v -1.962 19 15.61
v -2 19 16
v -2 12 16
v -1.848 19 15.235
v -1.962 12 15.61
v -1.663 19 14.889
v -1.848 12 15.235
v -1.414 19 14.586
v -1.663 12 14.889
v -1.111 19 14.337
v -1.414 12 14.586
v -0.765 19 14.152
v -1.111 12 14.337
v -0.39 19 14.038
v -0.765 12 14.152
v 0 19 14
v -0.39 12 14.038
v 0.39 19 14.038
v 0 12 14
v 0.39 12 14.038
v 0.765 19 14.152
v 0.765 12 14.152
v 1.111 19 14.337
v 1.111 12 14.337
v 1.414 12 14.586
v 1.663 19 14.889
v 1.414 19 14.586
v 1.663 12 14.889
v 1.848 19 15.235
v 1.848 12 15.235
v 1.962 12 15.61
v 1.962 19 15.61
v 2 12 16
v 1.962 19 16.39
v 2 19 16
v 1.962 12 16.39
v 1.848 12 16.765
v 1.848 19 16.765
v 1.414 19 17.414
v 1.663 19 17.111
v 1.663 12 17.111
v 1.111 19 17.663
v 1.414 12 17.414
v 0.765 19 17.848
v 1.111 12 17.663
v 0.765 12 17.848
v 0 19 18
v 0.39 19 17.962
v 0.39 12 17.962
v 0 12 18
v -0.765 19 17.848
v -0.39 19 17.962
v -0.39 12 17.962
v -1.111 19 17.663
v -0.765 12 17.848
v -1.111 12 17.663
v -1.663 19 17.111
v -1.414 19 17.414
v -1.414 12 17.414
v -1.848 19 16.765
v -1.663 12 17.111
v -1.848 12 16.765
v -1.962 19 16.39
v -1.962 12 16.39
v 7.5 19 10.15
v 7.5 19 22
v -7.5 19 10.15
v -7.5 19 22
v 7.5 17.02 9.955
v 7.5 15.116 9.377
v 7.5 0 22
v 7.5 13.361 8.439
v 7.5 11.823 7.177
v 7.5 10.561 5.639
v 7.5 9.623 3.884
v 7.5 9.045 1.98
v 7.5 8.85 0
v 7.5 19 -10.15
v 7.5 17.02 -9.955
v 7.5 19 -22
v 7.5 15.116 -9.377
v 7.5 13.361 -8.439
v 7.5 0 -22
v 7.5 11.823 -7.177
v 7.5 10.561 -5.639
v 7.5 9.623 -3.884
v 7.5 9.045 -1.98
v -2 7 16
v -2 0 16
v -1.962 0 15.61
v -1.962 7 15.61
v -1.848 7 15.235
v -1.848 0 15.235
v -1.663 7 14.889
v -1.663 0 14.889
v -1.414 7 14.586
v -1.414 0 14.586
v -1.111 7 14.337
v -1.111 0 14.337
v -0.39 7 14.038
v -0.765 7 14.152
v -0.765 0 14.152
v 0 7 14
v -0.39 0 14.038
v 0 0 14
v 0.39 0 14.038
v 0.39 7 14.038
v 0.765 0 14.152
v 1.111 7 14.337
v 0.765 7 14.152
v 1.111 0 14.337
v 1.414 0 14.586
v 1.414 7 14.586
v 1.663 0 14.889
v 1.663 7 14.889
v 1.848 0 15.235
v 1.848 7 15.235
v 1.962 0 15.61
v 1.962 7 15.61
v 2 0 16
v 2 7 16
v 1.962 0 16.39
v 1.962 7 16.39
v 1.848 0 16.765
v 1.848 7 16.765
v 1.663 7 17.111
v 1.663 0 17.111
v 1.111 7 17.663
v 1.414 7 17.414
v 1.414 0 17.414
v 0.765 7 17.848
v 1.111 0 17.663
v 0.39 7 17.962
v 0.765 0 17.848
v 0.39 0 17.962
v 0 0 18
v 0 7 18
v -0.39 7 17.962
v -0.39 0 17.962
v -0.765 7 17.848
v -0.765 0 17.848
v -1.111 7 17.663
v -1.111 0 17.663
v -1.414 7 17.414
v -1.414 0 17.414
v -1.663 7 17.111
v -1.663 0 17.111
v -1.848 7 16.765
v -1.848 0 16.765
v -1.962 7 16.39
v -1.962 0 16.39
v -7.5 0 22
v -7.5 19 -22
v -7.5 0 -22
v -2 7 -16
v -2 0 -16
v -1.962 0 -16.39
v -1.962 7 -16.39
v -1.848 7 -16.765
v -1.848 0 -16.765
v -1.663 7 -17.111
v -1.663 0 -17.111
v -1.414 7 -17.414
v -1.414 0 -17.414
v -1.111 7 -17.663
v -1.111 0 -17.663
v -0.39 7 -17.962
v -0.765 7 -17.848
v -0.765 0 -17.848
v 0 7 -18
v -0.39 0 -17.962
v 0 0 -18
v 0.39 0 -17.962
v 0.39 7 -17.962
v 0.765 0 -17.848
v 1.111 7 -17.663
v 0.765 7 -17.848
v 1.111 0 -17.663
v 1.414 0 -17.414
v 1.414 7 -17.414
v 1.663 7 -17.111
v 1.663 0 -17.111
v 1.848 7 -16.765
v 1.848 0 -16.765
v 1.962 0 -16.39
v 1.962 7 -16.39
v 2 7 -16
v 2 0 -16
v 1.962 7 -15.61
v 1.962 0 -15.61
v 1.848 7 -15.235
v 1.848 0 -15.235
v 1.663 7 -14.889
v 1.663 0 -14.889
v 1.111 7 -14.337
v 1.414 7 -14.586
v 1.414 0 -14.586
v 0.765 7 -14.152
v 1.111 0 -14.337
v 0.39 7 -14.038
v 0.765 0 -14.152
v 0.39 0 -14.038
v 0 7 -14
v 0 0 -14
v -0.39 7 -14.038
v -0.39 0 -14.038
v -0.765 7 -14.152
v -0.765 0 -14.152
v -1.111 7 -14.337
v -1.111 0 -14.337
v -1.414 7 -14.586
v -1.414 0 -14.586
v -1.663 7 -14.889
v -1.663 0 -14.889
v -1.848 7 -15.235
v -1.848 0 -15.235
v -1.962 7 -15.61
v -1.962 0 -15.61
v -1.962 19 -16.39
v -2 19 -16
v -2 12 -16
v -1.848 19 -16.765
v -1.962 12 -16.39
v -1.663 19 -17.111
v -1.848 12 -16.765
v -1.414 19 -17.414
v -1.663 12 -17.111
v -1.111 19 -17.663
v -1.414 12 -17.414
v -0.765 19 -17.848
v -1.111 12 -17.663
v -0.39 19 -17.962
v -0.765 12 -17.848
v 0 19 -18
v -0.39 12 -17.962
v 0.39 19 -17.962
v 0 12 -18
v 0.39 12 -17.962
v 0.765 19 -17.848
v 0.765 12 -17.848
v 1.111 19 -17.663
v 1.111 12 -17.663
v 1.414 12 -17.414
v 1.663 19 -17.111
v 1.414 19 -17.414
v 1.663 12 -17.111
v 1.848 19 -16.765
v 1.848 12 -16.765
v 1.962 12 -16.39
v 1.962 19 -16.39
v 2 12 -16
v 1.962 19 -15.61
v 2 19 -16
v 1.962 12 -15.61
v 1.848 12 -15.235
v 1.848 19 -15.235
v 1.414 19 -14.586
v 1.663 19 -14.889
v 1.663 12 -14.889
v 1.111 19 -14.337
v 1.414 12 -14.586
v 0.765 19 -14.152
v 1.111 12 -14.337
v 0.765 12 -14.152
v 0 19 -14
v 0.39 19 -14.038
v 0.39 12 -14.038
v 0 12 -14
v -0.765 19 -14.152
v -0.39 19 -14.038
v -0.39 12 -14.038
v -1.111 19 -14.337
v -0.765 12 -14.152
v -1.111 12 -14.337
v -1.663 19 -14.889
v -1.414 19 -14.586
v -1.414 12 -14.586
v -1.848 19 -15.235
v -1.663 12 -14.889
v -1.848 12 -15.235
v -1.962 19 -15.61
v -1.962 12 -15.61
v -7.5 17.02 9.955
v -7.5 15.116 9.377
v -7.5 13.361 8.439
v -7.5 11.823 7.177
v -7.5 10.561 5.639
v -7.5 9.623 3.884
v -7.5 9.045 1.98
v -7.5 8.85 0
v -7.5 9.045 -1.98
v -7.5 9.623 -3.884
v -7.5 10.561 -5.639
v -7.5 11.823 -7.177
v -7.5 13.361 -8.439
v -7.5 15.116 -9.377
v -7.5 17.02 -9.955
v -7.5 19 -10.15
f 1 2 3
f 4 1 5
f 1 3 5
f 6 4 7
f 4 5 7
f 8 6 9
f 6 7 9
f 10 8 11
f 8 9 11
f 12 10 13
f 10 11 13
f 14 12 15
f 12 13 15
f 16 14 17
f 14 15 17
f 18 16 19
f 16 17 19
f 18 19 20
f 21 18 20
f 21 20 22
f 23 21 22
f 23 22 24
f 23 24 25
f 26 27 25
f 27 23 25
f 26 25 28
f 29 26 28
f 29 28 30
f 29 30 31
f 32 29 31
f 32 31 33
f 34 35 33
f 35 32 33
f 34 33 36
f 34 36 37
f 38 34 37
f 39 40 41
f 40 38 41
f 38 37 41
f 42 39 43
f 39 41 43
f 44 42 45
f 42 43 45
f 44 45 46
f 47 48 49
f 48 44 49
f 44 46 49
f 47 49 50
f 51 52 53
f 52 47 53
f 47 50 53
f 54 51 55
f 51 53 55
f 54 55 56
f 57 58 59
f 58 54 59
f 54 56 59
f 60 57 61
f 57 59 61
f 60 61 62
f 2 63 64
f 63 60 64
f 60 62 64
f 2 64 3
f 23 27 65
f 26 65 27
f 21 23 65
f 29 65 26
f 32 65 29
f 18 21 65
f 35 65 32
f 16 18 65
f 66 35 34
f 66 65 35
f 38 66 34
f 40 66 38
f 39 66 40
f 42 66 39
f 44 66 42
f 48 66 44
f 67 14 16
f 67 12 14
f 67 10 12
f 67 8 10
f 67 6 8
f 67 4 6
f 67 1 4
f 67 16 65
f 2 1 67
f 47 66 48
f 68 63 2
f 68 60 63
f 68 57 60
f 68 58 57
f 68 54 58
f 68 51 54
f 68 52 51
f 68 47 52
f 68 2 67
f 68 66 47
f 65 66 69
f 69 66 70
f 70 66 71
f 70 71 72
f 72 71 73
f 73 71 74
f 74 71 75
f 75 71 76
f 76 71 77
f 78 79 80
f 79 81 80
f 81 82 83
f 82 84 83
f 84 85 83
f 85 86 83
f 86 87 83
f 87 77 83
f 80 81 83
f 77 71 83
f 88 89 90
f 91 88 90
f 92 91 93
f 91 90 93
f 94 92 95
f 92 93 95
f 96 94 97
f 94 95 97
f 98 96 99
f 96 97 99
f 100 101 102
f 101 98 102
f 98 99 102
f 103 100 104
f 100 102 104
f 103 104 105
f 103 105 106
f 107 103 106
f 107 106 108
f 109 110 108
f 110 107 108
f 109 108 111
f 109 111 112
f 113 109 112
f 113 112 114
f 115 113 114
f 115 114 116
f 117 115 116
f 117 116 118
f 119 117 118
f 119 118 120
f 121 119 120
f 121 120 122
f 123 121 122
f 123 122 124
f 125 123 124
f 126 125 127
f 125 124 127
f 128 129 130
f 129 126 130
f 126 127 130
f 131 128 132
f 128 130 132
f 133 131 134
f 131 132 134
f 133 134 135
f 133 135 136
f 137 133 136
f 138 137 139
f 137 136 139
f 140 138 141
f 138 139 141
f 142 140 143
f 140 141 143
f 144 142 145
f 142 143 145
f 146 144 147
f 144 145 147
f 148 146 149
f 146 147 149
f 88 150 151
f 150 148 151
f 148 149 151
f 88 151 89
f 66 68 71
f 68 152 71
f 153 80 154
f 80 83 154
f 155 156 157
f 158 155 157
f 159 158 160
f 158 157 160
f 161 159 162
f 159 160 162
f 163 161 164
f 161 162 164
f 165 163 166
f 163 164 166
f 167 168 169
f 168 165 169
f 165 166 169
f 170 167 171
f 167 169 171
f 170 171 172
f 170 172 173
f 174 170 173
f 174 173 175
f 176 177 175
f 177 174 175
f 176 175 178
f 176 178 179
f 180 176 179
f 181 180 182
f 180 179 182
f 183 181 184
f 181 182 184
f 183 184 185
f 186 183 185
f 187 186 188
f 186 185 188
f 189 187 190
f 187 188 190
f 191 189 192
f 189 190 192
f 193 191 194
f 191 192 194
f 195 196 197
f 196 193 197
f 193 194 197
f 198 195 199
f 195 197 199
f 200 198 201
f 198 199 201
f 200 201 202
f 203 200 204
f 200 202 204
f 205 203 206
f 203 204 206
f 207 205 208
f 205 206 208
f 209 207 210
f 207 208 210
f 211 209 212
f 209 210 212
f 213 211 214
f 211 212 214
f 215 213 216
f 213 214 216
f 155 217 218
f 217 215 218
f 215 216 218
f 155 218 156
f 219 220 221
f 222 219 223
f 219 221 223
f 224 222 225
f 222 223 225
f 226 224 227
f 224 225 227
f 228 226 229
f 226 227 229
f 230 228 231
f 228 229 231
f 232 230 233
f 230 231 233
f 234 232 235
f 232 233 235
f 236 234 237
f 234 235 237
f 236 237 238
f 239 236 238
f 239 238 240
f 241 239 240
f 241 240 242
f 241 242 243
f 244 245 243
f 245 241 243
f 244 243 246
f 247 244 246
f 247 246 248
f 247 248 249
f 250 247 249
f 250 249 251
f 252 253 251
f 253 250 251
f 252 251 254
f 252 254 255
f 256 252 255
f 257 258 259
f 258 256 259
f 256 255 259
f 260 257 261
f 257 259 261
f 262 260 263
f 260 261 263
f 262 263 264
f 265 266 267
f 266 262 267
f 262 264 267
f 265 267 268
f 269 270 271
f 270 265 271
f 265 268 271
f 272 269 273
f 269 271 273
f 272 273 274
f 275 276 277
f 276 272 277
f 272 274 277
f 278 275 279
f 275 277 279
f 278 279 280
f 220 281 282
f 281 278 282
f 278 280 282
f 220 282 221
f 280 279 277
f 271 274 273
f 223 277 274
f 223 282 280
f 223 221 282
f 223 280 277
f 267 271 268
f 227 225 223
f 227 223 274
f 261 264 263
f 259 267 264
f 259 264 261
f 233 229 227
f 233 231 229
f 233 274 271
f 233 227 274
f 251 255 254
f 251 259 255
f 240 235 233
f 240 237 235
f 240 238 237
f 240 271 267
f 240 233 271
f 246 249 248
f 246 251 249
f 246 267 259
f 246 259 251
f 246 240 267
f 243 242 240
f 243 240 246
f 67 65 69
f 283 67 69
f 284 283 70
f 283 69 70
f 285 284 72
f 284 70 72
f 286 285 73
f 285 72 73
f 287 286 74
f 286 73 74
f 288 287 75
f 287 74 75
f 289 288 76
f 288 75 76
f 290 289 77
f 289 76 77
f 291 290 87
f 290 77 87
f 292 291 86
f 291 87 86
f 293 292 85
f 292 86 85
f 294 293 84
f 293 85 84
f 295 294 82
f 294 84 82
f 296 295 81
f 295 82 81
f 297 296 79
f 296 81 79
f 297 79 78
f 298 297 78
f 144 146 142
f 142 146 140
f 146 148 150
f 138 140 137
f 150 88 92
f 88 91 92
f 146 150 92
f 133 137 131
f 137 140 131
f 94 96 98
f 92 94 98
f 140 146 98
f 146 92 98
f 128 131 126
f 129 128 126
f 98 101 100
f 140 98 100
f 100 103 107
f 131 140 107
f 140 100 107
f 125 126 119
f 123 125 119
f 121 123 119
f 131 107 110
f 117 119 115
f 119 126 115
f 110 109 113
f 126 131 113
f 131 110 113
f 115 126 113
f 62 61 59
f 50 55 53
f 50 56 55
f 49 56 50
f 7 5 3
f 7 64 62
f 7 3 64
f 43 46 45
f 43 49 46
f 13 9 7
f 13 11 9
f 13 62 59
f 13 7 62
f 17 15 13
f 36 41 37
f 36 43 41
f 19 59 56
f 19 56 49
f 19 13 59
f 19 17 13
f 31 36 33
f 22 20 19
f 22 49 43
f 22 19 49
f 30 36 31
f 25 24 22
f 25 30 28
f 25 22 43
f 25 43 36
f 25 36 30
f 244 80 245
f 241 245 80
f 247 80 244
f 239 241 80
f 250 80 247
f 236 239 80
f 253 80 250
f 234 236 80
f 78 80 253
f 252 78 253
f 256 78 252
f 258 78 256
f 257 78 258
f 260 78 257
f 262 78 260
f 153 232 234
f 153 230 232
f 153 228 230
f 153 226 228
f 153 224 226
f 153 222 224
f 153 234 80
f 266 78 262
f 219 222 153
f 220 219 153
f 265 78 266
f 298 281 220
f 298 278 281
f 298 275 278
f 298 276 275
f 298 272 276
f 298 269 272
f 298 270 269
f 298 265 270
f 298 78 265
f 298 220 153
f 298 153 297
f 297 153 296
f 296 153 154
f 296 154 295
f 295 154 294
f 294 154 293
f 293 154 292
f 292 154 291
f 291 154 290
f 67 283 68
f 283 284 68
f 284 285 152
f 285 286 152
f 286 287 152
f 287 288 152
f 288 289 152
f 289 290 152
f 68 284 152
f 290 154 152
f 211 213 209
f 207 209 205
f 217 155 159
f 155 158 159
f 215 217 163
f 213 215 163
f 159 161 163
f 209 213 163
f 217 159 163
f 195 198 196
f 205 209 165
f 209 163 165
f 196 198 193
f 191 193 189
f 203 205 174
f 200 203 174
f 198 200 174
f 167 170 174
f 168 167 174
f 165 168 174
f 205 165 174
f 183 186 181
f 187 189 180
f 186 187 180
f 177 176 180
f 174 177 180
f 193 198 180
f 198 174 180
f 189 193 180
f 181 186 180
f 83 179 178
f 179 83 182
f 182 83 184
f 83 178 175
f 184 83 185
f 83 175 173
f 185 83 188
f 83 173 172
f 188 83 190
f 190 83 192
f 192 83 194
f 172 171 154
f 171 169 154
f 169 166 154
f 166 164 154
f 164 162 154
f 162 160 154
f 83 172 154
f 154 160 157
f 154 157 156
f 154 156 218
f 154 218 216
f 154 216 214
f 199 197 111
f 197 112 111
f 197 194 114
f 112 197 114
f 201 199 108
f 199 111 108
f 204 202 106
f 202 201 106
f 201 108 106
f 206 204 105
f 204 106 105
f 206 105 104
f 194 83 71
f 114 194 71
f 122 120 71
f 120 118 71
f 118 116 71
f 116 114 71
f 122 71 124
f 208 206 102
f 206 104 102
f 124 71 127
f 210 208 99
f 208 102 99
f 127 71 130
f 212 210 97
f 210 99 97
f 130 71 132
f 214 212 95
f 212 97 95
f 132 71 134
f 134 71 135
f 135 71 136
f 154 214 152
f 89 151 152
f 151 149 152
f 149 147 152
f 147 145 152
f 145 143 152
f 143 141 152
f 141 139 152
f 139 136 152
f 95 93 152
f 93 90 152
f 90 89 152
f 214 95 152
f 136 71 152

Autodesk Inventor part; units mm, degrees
ref_plane "YZ Plane" through (0, 0, 0) normal (1, 0, 0) x (0, 1, 0)
ref_plane "XZ Plane" through (0, 0, 0) normal (0, 1, 0) x (-1, 0, 0)
ref_plane "XY Plane" through (0, 0, 0) normal (0, 0, 1) x (1, 0, 0)
sketch "Эскиз1" plane through (0, 0, 0) normal (0, 1, 0) x (-1, 0, 0)
  line L0 (7.5, 22) -> (-7.5, 22)
  line L1 (-7.5, 22) -> (-7.5, -22)
  line L2 (-7.5, -22) -> (7.5, -22)
  line L3 (7.5, -22) -> (7.5, 22)
  line L4 (-7.5, 22) -> (7.5, -22) construction
  line L5 (0, 22) -> (0, -22) construction
  circle A0 centre (0, 16) radius 2
  line L6 (7.5, 0) -> (-7.5, 0) construction
  circle A1 centre (0, -16) radius 2
  point P0 (0, 0)
  point P1 (0, 0)
  dimension "d0" = 15
  dimension "d1" = 44
  dimension "d2" = 16
  dimension "d3" = 4
extrude "Выдавливание1" add sketch "Эскиз1" along normal blind 19
sketch "Эскиз2" plane through (7.5, 0, 22) normal (1, 0, 0) x (0, 0, -1)
  line L0 (0, 19) -> (44, 19) projected
  circle A0 centre (22, 19) radius 10.15
  point P0 (22, 0)
  dimension "d6" = 20.3
extrude "Выдавливание2" cut sketch "Эскиз2" against normal through all
ref_plane "РабПлоскость1" through (0, 12, 0) normal (0, 1, 0) x (1, 0, 0)
sketch "Эскиз3" plane through (0, 12, 0) normal (0, 1, 0) x (1, 0, 0)
  circle A0 centre (0, 16) radius 2 projected
  circle A1 centre (0, -16) radius 2 projected
  point P0 (0, 0)
extrude "Выдавливание3" add sketch "Эскиз3" against normal blind 5
properties part number "motor_mount_UP"
